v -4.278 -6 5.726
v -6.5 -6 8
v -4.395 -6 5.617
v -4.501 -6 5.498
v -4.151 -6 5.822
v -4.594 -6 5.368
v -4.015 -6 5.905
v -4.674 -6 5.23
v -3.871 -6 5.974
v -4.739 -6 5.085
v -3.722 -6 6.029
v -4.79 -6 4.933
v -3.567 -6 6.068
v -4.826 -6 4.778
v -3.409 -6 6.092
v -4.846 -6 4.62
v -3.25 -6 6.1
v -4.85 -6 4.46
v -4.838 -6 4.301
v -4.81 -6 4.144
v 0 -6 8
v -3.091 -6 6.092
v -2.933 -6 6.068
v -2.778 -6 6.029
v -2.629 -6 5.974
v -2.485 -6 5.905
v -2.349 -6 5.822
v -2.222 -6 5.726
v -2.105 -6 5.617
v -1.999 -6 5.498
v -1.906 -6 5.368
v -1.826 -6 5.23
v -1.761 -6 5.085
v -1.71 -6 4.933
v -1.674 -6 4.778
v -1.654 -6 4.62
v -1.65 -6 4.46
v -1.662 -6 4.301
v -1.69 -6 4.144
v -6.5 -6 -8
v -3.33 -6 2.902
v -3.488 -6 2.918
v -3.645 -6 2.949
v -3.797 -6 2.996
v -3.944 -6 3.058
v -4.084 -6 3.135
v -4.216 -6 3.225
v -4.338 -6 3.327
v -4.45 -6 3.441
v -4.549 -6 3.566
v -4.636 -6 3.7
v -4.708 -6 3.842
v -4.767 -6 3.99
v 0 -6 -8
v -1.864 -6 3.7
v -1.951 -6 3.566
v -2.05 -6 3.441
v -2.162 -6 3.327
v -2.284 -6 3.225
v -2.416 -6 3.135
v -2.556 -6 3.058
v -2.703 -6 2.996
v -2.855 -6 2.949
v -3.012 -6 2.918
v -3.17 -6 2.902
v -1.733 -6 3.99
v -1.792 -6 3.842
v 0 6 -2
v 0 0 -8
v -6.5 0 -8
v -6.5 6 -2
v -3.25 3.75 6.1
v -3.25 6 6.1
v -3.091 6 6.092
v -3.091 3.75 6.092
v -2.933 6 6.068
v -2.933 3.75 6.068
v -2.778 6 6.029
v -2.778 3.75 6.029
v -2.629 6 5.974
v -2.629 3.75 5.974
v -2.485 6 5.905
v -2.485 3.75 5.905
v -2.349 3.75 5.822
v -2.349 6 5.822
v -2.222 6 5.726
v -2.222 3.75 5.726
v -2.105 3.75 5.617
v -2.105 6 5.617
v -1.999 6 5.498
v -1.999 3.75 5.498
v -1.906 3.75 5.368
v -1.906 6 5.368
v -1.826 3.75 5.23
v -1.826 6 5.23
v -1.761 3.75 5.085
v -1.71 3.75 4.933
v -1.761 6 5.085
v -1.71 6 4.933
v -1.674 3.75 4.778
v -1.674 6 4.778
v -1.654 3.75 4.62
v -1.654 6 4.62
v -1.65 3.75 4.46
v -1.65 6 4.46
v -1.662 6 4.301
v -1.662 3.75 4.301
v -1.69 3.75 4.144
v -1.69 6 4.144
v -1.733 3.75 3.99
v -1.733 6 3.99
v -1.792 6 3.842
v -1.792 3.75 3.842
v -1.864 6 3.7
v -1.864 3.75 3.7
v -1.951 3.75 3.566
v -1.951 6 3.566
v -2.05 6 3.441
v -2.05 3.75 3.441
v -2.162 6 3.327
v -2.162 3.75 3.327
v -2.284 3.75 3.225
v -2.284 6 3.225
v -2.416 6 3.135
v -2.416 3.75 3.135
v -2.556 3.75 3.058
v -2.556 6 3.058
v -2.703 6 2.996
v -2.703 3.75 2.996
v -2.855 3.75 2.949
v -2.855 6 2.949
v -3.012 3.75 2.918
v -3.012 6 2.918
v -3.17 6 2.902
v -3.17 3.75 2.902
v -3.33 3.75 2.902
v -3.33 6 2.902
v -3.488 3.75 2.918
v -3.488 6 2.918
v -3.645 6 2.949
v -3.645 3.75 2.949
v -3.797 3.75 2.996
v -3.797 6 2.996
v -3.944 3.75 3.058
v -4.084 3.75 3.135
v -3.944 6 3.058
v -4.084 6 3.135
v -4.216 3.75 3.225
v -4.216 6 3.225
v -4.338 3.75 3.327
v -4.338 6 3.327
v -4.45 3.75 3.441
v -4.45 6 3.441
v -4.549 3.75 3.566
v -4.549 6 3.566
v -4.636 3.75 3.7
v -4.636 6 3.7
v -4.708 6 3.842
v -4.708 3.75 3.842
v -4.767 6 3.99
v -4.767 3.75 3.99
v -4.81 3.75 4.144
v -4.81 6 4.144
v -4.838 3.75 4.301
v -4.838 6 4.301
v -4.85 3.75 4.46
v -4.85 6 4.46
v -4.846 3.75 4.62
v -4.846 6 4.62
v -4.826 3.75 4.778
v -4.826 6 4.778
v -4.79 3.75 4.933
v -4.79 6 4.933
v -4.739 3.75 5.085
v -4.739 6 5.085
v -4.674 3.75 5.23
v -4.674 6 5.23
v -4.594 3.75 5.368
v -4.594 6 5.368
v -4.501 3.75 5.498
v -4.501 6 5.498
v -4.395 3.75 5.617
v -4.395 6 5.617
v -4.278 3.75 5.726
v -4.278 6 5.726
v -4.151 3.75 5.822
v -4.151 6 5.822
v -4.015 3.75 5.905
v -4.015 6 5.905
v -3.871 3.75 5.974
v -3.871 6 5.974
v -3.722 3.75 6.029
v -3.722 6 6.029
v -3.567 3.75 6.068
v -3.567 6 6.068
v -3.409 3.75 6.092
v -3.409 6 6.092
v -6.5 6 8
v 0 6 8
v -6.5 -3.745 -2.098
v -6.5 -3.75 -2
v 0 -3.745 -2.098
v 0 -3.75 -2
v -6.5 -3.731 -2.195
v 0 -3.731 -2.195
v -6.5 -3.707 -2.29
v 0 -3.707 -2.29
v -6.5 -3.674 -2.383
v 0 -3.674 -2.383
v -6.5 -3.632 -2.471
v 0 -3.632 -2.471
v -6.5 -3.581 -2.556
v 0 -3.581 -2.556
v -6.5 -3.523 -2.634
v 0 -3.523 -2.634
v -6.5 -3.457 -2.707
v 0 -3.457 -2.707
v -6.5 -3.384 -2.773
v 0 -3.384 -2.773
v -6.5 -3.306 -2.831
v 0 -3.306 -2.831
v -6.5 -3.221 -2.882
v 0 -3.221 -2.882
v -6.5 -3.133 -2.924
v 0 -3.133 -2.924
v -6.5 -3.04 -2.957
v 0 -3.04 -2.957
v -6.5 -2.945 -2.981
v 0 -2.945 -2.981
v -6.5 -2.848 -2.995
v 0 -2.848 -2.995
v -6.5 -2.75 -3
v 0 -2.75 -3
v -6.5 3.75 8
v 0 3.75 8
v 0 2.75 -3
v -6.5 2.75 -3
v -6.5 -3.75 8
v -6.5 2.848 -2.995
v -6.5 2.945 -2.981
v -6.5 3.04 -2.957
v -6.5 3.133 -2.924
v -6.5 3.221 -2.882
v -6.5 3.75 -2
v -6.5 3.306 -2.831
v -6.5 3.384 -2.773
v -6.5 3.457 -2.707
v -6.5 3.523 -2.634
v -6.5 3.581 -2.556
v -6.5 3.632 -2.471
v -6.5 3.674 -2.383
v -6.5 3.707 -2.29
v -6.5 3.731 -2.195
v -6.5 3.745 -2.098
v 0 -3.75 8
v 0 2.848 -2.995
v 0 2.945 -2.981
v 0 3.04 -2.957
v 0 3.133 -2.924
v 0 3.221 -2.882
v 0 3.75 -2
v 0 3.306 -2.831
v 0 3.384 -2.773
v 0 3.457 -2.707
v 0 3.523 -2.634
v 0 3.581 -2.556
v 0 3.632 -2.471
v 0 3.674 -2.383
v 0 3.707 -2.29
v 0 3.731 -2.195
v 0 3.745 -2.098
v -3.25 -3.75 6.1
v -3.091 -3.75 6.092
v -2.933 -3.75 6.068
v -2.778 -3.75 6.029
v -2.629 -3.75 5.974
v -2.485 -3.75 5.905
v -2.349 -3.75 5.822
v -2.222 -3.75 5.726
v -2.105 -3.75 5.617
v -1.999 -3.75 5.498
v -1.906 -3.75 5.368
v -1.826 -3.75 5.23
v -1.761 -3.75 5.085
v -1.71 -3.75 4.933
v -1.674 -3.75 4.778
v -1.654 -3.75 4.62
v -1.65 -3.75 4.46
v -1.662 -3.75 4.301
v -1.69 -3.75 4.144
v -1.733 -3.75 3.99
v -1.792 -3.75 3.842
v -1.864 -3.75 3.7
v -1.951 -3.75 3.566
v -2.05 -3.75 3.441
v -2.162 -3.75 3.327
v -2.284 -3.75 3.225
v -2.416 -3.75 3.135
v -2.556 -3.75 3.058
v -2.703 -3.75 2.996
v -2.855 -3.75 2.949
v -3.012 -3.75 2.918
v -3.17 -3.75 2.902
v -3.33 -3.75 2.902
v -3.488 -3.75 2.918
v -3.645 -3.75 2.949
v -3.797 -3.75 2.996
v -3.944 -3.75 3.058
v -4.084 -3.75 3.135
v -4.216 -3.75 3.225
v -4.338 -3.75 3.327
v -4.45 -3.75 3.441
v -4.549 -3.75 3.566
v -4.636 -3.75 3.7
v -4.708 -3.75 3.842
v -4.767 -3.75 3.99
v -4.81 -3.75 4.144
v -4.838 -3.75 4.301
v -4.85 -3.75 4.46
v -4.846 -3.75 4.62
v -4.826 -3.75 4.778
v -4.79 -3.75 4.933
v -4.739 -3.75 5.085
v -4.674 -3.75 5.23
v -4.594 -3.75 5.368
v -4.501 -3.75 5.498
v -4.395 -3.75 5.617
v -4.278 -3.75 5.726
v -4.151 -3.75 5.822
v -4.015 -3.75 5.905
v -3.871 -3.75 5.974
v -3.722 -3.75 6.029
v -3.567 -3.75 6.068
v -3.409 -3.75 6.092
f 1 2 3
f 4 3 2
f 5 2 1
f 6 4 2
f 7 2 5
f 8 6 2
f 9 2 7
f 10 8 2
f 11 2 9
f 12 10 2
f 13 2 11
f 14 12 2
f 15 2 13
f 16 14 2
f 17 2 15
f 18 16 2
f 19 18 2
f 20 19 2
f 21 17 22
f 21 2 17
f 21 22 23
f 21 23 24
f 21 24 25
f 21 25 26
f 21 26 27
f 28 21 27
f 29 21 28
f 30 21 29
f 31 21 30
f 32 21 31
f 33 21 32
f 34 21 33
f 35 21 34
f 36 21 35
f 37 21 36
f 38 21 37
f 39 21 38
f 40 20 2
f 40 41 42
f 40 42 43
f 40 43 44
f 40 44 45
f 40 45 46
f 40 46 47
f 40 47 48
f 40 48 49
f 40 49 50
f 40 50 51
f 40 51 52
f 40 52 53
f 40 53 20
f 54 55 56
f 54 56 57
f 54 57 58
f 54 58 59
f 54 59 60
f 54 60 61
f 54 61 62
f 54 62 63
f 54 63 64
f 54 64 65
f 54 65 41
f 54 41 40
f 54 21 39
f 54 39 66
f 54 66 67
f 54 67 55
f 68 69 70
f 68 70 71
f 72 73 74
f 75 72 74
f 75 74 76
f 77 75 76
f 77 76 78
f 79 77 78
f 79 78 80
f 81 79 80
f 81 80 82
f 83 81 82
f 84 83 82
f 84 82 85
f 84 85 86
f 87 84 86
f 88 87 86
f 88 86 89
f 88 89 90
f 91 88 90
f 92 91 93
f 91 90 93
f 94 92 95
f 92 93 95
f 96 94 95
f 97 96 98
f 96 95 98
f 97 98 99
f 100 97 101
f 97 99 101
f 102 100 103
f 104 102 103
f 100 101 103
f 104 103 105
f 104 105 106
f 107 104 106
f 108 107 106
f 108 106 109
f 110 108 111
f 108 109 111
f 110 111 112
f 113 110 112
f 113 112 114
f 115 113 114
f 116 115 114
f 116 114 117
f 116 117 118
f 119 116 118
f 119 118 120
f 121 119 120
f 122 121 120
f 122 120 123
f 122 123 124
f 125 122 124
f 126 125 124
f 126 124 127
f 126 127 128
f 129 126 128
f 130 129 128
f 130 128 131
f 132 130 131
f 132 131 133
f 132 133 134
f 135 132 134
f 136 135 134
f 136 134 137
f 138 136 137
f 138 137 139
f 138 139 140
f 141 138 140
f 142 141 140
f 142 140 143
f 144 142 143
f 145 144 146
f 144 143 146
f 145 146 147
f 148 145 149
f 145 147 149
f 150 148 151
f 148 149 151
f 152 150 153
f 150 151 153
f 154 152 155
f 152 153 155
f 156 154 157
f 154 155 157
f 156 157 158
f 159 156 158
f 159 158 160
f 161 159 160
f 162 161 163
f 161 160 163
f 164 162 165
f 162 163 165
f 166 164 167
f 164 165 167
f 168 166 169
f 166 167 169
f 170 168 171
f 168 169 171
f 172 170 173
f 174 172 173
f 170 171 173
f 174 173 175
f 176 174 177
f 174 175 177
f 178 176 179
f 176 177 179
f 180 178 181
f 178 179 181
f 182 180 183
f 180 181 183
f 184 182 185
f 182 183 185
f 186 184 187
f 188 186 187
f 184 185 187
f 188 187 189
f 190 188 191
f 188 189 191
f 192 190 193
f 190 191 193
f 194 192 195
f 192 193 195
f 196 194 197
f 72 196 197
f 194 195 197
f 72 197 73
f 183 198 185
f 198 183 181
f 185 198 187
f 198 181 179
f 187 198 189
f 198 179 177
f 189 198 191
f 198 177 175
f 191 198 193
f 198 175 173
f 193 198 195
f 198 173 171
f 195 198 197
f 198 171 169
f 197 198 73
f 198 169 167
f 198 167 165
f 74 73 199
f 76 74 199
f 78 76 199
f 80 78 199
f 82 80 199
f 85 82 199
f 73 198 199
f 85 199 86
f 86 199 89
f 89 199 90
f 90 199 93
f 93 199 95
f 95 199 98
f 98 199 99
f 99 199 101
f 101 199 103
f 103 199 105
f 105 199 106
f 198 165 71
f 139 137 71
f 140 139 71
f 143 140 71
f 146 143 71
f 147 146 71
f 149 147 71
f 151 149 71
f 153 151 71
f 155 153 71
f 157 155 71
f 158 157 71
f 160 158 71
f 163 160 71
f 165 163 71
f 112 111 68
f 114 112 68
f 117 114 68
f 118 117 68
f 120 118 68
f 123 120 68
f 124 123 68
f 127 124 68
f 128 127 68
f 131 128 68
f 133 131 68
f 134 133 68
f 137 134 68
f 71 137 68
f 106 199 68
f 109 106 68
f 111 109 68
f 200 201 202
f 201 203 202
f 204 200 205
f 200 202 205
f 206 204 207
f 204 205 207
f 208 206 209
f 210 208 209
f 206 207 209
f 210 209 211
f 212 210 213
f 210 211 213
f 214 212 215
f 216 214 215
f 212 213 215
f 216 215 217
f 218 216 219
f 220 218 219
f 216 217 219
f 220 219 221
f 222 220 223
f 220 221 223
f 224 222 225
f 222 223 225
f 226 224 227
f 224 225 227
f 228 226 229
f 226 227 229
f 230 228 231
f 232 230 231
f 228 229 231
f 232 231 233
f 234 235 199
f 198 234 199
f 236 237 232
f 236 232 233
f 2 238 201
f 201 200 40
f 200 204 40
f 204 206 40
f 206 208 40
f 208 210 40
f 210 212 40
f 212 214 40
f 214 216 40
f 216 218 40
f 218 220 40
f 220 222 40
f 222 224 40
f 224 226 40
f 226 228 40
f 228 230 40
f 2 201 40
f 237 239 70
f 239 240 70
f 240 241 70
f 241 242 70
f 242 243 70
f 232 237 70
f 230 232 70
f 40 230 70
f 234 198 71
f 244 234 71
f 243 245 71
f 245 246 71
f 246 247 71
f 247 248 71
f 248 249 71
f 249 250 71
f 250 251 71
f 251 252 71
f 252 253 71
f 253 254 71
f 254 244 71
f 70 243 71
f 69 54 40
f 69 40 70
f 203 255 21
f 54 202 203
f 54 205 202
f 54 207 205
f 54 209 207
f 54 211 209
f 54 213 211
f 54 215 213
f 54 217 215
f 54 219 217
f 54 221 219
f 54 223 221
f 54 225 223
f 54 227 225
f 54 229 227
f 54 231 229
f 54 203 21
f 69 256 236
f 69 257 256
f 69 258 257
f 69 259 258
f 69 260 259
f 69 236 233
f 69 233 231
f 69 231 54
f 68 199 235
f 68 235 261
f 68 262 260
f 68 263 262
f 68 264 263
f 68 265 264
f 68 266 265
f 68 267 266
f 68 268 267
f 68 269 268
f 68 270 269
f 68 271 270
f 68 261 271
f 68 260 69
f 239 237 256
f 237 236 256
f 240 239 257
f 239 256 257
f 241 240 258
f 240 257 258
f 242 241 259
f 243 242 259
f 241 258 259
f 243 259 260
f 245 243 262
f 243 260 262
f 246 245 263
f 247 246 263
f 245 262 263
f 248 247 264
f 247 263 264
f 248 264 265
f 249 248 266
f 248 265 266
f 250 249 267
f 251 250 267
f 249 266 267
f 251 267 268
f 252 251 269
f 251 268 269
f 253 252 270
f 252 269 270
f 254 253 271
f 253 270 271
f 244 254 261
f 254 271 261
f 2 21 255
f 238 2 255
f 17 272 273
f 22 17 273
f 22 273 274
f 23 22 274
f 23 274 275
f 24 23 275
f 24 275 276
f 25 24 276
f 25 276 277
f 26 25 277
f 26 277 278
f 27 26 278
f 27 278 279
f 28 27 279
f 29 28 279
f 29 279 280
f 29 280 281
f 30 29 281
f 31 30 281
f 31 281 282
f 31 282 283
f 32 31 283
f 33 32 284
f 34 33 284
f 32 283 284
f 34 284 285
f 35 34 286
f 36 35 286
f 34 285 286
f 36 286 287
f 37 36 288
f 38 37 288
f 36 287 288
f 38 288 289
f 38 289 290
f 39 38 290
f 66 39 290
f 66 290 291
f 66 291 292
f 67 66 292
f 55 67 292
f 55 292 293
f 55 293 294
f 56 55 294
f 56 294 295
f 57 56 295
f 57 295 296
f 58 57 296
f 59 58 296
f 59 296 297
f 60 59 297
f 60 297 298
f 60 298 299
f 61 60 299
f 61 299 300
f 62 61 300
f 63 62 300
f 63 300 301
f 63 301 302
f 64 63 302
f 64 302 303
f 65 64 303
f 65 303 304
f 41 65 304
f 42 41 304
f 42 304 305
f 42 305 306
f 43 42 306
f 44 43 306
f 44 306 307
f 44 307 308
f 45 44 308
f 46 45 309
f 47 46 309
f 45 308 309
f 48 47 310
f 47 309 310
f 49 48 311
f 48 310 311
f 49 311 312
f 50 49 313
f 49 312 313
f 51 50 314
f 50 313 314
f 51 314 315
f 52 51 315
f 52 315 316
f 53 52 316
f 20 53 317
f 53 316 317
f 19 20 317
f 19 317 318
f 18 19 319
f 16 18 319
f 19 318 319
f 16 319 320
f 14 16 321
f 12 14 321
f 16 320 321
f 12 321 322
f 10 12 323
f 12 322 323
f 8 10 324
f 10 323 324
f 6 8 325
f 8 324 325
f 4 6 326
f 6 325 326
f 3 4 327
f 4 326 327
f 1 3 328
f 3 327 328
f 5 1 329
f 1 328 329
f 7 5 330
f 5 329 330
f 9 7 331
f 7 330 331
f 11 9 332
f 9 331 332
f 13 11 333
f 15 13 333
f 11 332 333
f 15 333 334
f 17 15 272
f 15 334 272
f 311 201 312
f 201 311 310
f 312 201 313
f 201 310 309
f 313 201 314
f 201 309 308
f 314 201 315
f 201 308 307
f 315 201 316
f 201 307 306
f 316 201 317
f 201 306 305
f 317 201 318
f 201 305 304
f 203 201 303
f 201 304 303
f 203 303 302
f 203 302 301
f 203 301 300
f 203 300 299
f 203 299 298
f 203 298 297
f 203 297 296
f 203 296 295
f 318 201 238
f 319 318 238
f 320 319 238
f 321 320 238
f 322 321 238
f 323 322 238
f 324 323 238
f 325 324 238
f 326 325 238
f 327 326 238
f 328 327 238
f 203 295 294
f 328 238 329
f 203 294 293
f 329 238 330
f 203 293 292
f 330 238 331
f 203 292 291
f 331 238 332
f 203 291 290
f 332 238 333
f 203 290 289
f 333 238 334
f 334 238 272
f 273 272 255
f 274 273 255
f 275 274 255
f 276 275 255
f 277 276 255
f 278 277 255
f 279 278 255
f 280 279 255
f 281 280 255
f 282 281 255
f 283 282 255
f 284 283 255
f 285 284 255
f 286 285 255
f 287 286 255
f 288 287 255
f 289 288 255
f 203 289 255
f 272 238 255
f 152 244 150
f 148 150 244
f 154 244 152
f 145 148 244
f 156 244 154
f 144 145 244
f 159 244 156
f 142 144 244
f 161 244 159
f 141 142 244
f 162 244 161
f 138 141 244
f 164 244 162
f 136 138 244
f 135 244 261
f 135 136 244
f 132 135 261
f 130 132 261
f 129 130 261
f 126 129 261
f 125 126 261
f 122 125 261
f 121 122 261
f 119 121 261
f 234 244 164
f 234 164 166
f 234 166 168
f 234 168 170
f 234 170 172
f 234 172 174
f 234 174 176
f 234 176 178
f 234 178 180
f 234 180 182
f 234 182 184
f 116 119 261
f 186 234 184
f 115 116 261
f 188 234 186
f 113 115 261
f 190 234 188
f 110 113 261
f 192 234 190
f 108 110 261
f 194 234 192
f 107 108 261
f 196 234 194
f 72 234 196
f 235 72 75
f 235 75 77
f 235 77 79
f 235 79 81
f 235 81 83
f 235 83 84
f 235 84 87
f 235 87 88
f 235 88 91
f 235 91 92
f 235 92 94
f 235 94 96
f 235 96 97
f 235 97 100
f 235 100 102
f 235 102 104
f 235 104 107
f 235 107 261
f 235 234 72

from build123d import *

# Parameters (mm, degrees)
SKETCH1_W           = 16
SKETCH1_H           = 12
BOSS_EXTRUDE1_DEPTH = 6.5
CUT_EXTRUDE1_DEPTH  = 12.926860442
SKETCH3_W           = 14
SKETCH3_H           = 7.5
CUT_EXTRUDE2_DEPTH  = 11
SKETCH4_R           = 1.6
CUT_EXTRUDE3_DEPTH  = 16.81929202
FILLET1_R           = 1


with BuildPart() as part:
    # Sketch1 → Boss-Extrude1 (new body)
    with BuildSketch(Plane(origin=(0, 0, 0), x_dir=(0, 0, -1), z_dir=(1, 0, 0))):
        Rectangle(SKETCH1_W, SKETCH1_H)
    extrude(amount=-BOSS_EXTRUDE1_DEPTH)

    # Sketch2 → Cut-Extrude1 (cut, through all)
    with BuildSketch(Plane(origin=(0, 0, 0), x_dir=(0, 0, -1), z_dir=(1, 0, 0))):
        Polygon((8, 0), (2, 6), (8, 6), align=None)
    extrude(amount=-CUT_EXTRUDE1_DEPTH, mode=Mode.SUBTRACT)

    # Sketch3 → Cut-Extrude2 (cut)
    with BuildSketch(Plane.XY.offset(8)):
        with Locations((-3.25, 0)):
            Rectangle(SKETCH3_W, SKETCH3_H)
    extrude(amount=-CUT_EXTRUDE2_DEPTH, mode=Mode.SUBTRACT)

    # Sketch4 → Cut-Extrude3 (cut, through all)
    with BuildSketch(Plane(origin=(0, 6, 0), x_dir=(1, 0, 0), z_dir=(0, 1, 0))):
        with Locations(Location((-3.25, -4.5, 0), (0, 0, 270))):
            Circle(SKETCH4_R)
    extrude(amount=-CUT_EXTRUDE3_DEPTH, mode=Mode.SUBTRACT)

    # Fillet1
    fillet1_edges = [part.edges().sort_by_distance(p)[0] for p in [
        (-3.25, -3.75, -3),
        (-3.25, 3.75, -3),
    ]]
    fillet(fillet1_edges, radius=FILLET1_R)


solid = part.part
